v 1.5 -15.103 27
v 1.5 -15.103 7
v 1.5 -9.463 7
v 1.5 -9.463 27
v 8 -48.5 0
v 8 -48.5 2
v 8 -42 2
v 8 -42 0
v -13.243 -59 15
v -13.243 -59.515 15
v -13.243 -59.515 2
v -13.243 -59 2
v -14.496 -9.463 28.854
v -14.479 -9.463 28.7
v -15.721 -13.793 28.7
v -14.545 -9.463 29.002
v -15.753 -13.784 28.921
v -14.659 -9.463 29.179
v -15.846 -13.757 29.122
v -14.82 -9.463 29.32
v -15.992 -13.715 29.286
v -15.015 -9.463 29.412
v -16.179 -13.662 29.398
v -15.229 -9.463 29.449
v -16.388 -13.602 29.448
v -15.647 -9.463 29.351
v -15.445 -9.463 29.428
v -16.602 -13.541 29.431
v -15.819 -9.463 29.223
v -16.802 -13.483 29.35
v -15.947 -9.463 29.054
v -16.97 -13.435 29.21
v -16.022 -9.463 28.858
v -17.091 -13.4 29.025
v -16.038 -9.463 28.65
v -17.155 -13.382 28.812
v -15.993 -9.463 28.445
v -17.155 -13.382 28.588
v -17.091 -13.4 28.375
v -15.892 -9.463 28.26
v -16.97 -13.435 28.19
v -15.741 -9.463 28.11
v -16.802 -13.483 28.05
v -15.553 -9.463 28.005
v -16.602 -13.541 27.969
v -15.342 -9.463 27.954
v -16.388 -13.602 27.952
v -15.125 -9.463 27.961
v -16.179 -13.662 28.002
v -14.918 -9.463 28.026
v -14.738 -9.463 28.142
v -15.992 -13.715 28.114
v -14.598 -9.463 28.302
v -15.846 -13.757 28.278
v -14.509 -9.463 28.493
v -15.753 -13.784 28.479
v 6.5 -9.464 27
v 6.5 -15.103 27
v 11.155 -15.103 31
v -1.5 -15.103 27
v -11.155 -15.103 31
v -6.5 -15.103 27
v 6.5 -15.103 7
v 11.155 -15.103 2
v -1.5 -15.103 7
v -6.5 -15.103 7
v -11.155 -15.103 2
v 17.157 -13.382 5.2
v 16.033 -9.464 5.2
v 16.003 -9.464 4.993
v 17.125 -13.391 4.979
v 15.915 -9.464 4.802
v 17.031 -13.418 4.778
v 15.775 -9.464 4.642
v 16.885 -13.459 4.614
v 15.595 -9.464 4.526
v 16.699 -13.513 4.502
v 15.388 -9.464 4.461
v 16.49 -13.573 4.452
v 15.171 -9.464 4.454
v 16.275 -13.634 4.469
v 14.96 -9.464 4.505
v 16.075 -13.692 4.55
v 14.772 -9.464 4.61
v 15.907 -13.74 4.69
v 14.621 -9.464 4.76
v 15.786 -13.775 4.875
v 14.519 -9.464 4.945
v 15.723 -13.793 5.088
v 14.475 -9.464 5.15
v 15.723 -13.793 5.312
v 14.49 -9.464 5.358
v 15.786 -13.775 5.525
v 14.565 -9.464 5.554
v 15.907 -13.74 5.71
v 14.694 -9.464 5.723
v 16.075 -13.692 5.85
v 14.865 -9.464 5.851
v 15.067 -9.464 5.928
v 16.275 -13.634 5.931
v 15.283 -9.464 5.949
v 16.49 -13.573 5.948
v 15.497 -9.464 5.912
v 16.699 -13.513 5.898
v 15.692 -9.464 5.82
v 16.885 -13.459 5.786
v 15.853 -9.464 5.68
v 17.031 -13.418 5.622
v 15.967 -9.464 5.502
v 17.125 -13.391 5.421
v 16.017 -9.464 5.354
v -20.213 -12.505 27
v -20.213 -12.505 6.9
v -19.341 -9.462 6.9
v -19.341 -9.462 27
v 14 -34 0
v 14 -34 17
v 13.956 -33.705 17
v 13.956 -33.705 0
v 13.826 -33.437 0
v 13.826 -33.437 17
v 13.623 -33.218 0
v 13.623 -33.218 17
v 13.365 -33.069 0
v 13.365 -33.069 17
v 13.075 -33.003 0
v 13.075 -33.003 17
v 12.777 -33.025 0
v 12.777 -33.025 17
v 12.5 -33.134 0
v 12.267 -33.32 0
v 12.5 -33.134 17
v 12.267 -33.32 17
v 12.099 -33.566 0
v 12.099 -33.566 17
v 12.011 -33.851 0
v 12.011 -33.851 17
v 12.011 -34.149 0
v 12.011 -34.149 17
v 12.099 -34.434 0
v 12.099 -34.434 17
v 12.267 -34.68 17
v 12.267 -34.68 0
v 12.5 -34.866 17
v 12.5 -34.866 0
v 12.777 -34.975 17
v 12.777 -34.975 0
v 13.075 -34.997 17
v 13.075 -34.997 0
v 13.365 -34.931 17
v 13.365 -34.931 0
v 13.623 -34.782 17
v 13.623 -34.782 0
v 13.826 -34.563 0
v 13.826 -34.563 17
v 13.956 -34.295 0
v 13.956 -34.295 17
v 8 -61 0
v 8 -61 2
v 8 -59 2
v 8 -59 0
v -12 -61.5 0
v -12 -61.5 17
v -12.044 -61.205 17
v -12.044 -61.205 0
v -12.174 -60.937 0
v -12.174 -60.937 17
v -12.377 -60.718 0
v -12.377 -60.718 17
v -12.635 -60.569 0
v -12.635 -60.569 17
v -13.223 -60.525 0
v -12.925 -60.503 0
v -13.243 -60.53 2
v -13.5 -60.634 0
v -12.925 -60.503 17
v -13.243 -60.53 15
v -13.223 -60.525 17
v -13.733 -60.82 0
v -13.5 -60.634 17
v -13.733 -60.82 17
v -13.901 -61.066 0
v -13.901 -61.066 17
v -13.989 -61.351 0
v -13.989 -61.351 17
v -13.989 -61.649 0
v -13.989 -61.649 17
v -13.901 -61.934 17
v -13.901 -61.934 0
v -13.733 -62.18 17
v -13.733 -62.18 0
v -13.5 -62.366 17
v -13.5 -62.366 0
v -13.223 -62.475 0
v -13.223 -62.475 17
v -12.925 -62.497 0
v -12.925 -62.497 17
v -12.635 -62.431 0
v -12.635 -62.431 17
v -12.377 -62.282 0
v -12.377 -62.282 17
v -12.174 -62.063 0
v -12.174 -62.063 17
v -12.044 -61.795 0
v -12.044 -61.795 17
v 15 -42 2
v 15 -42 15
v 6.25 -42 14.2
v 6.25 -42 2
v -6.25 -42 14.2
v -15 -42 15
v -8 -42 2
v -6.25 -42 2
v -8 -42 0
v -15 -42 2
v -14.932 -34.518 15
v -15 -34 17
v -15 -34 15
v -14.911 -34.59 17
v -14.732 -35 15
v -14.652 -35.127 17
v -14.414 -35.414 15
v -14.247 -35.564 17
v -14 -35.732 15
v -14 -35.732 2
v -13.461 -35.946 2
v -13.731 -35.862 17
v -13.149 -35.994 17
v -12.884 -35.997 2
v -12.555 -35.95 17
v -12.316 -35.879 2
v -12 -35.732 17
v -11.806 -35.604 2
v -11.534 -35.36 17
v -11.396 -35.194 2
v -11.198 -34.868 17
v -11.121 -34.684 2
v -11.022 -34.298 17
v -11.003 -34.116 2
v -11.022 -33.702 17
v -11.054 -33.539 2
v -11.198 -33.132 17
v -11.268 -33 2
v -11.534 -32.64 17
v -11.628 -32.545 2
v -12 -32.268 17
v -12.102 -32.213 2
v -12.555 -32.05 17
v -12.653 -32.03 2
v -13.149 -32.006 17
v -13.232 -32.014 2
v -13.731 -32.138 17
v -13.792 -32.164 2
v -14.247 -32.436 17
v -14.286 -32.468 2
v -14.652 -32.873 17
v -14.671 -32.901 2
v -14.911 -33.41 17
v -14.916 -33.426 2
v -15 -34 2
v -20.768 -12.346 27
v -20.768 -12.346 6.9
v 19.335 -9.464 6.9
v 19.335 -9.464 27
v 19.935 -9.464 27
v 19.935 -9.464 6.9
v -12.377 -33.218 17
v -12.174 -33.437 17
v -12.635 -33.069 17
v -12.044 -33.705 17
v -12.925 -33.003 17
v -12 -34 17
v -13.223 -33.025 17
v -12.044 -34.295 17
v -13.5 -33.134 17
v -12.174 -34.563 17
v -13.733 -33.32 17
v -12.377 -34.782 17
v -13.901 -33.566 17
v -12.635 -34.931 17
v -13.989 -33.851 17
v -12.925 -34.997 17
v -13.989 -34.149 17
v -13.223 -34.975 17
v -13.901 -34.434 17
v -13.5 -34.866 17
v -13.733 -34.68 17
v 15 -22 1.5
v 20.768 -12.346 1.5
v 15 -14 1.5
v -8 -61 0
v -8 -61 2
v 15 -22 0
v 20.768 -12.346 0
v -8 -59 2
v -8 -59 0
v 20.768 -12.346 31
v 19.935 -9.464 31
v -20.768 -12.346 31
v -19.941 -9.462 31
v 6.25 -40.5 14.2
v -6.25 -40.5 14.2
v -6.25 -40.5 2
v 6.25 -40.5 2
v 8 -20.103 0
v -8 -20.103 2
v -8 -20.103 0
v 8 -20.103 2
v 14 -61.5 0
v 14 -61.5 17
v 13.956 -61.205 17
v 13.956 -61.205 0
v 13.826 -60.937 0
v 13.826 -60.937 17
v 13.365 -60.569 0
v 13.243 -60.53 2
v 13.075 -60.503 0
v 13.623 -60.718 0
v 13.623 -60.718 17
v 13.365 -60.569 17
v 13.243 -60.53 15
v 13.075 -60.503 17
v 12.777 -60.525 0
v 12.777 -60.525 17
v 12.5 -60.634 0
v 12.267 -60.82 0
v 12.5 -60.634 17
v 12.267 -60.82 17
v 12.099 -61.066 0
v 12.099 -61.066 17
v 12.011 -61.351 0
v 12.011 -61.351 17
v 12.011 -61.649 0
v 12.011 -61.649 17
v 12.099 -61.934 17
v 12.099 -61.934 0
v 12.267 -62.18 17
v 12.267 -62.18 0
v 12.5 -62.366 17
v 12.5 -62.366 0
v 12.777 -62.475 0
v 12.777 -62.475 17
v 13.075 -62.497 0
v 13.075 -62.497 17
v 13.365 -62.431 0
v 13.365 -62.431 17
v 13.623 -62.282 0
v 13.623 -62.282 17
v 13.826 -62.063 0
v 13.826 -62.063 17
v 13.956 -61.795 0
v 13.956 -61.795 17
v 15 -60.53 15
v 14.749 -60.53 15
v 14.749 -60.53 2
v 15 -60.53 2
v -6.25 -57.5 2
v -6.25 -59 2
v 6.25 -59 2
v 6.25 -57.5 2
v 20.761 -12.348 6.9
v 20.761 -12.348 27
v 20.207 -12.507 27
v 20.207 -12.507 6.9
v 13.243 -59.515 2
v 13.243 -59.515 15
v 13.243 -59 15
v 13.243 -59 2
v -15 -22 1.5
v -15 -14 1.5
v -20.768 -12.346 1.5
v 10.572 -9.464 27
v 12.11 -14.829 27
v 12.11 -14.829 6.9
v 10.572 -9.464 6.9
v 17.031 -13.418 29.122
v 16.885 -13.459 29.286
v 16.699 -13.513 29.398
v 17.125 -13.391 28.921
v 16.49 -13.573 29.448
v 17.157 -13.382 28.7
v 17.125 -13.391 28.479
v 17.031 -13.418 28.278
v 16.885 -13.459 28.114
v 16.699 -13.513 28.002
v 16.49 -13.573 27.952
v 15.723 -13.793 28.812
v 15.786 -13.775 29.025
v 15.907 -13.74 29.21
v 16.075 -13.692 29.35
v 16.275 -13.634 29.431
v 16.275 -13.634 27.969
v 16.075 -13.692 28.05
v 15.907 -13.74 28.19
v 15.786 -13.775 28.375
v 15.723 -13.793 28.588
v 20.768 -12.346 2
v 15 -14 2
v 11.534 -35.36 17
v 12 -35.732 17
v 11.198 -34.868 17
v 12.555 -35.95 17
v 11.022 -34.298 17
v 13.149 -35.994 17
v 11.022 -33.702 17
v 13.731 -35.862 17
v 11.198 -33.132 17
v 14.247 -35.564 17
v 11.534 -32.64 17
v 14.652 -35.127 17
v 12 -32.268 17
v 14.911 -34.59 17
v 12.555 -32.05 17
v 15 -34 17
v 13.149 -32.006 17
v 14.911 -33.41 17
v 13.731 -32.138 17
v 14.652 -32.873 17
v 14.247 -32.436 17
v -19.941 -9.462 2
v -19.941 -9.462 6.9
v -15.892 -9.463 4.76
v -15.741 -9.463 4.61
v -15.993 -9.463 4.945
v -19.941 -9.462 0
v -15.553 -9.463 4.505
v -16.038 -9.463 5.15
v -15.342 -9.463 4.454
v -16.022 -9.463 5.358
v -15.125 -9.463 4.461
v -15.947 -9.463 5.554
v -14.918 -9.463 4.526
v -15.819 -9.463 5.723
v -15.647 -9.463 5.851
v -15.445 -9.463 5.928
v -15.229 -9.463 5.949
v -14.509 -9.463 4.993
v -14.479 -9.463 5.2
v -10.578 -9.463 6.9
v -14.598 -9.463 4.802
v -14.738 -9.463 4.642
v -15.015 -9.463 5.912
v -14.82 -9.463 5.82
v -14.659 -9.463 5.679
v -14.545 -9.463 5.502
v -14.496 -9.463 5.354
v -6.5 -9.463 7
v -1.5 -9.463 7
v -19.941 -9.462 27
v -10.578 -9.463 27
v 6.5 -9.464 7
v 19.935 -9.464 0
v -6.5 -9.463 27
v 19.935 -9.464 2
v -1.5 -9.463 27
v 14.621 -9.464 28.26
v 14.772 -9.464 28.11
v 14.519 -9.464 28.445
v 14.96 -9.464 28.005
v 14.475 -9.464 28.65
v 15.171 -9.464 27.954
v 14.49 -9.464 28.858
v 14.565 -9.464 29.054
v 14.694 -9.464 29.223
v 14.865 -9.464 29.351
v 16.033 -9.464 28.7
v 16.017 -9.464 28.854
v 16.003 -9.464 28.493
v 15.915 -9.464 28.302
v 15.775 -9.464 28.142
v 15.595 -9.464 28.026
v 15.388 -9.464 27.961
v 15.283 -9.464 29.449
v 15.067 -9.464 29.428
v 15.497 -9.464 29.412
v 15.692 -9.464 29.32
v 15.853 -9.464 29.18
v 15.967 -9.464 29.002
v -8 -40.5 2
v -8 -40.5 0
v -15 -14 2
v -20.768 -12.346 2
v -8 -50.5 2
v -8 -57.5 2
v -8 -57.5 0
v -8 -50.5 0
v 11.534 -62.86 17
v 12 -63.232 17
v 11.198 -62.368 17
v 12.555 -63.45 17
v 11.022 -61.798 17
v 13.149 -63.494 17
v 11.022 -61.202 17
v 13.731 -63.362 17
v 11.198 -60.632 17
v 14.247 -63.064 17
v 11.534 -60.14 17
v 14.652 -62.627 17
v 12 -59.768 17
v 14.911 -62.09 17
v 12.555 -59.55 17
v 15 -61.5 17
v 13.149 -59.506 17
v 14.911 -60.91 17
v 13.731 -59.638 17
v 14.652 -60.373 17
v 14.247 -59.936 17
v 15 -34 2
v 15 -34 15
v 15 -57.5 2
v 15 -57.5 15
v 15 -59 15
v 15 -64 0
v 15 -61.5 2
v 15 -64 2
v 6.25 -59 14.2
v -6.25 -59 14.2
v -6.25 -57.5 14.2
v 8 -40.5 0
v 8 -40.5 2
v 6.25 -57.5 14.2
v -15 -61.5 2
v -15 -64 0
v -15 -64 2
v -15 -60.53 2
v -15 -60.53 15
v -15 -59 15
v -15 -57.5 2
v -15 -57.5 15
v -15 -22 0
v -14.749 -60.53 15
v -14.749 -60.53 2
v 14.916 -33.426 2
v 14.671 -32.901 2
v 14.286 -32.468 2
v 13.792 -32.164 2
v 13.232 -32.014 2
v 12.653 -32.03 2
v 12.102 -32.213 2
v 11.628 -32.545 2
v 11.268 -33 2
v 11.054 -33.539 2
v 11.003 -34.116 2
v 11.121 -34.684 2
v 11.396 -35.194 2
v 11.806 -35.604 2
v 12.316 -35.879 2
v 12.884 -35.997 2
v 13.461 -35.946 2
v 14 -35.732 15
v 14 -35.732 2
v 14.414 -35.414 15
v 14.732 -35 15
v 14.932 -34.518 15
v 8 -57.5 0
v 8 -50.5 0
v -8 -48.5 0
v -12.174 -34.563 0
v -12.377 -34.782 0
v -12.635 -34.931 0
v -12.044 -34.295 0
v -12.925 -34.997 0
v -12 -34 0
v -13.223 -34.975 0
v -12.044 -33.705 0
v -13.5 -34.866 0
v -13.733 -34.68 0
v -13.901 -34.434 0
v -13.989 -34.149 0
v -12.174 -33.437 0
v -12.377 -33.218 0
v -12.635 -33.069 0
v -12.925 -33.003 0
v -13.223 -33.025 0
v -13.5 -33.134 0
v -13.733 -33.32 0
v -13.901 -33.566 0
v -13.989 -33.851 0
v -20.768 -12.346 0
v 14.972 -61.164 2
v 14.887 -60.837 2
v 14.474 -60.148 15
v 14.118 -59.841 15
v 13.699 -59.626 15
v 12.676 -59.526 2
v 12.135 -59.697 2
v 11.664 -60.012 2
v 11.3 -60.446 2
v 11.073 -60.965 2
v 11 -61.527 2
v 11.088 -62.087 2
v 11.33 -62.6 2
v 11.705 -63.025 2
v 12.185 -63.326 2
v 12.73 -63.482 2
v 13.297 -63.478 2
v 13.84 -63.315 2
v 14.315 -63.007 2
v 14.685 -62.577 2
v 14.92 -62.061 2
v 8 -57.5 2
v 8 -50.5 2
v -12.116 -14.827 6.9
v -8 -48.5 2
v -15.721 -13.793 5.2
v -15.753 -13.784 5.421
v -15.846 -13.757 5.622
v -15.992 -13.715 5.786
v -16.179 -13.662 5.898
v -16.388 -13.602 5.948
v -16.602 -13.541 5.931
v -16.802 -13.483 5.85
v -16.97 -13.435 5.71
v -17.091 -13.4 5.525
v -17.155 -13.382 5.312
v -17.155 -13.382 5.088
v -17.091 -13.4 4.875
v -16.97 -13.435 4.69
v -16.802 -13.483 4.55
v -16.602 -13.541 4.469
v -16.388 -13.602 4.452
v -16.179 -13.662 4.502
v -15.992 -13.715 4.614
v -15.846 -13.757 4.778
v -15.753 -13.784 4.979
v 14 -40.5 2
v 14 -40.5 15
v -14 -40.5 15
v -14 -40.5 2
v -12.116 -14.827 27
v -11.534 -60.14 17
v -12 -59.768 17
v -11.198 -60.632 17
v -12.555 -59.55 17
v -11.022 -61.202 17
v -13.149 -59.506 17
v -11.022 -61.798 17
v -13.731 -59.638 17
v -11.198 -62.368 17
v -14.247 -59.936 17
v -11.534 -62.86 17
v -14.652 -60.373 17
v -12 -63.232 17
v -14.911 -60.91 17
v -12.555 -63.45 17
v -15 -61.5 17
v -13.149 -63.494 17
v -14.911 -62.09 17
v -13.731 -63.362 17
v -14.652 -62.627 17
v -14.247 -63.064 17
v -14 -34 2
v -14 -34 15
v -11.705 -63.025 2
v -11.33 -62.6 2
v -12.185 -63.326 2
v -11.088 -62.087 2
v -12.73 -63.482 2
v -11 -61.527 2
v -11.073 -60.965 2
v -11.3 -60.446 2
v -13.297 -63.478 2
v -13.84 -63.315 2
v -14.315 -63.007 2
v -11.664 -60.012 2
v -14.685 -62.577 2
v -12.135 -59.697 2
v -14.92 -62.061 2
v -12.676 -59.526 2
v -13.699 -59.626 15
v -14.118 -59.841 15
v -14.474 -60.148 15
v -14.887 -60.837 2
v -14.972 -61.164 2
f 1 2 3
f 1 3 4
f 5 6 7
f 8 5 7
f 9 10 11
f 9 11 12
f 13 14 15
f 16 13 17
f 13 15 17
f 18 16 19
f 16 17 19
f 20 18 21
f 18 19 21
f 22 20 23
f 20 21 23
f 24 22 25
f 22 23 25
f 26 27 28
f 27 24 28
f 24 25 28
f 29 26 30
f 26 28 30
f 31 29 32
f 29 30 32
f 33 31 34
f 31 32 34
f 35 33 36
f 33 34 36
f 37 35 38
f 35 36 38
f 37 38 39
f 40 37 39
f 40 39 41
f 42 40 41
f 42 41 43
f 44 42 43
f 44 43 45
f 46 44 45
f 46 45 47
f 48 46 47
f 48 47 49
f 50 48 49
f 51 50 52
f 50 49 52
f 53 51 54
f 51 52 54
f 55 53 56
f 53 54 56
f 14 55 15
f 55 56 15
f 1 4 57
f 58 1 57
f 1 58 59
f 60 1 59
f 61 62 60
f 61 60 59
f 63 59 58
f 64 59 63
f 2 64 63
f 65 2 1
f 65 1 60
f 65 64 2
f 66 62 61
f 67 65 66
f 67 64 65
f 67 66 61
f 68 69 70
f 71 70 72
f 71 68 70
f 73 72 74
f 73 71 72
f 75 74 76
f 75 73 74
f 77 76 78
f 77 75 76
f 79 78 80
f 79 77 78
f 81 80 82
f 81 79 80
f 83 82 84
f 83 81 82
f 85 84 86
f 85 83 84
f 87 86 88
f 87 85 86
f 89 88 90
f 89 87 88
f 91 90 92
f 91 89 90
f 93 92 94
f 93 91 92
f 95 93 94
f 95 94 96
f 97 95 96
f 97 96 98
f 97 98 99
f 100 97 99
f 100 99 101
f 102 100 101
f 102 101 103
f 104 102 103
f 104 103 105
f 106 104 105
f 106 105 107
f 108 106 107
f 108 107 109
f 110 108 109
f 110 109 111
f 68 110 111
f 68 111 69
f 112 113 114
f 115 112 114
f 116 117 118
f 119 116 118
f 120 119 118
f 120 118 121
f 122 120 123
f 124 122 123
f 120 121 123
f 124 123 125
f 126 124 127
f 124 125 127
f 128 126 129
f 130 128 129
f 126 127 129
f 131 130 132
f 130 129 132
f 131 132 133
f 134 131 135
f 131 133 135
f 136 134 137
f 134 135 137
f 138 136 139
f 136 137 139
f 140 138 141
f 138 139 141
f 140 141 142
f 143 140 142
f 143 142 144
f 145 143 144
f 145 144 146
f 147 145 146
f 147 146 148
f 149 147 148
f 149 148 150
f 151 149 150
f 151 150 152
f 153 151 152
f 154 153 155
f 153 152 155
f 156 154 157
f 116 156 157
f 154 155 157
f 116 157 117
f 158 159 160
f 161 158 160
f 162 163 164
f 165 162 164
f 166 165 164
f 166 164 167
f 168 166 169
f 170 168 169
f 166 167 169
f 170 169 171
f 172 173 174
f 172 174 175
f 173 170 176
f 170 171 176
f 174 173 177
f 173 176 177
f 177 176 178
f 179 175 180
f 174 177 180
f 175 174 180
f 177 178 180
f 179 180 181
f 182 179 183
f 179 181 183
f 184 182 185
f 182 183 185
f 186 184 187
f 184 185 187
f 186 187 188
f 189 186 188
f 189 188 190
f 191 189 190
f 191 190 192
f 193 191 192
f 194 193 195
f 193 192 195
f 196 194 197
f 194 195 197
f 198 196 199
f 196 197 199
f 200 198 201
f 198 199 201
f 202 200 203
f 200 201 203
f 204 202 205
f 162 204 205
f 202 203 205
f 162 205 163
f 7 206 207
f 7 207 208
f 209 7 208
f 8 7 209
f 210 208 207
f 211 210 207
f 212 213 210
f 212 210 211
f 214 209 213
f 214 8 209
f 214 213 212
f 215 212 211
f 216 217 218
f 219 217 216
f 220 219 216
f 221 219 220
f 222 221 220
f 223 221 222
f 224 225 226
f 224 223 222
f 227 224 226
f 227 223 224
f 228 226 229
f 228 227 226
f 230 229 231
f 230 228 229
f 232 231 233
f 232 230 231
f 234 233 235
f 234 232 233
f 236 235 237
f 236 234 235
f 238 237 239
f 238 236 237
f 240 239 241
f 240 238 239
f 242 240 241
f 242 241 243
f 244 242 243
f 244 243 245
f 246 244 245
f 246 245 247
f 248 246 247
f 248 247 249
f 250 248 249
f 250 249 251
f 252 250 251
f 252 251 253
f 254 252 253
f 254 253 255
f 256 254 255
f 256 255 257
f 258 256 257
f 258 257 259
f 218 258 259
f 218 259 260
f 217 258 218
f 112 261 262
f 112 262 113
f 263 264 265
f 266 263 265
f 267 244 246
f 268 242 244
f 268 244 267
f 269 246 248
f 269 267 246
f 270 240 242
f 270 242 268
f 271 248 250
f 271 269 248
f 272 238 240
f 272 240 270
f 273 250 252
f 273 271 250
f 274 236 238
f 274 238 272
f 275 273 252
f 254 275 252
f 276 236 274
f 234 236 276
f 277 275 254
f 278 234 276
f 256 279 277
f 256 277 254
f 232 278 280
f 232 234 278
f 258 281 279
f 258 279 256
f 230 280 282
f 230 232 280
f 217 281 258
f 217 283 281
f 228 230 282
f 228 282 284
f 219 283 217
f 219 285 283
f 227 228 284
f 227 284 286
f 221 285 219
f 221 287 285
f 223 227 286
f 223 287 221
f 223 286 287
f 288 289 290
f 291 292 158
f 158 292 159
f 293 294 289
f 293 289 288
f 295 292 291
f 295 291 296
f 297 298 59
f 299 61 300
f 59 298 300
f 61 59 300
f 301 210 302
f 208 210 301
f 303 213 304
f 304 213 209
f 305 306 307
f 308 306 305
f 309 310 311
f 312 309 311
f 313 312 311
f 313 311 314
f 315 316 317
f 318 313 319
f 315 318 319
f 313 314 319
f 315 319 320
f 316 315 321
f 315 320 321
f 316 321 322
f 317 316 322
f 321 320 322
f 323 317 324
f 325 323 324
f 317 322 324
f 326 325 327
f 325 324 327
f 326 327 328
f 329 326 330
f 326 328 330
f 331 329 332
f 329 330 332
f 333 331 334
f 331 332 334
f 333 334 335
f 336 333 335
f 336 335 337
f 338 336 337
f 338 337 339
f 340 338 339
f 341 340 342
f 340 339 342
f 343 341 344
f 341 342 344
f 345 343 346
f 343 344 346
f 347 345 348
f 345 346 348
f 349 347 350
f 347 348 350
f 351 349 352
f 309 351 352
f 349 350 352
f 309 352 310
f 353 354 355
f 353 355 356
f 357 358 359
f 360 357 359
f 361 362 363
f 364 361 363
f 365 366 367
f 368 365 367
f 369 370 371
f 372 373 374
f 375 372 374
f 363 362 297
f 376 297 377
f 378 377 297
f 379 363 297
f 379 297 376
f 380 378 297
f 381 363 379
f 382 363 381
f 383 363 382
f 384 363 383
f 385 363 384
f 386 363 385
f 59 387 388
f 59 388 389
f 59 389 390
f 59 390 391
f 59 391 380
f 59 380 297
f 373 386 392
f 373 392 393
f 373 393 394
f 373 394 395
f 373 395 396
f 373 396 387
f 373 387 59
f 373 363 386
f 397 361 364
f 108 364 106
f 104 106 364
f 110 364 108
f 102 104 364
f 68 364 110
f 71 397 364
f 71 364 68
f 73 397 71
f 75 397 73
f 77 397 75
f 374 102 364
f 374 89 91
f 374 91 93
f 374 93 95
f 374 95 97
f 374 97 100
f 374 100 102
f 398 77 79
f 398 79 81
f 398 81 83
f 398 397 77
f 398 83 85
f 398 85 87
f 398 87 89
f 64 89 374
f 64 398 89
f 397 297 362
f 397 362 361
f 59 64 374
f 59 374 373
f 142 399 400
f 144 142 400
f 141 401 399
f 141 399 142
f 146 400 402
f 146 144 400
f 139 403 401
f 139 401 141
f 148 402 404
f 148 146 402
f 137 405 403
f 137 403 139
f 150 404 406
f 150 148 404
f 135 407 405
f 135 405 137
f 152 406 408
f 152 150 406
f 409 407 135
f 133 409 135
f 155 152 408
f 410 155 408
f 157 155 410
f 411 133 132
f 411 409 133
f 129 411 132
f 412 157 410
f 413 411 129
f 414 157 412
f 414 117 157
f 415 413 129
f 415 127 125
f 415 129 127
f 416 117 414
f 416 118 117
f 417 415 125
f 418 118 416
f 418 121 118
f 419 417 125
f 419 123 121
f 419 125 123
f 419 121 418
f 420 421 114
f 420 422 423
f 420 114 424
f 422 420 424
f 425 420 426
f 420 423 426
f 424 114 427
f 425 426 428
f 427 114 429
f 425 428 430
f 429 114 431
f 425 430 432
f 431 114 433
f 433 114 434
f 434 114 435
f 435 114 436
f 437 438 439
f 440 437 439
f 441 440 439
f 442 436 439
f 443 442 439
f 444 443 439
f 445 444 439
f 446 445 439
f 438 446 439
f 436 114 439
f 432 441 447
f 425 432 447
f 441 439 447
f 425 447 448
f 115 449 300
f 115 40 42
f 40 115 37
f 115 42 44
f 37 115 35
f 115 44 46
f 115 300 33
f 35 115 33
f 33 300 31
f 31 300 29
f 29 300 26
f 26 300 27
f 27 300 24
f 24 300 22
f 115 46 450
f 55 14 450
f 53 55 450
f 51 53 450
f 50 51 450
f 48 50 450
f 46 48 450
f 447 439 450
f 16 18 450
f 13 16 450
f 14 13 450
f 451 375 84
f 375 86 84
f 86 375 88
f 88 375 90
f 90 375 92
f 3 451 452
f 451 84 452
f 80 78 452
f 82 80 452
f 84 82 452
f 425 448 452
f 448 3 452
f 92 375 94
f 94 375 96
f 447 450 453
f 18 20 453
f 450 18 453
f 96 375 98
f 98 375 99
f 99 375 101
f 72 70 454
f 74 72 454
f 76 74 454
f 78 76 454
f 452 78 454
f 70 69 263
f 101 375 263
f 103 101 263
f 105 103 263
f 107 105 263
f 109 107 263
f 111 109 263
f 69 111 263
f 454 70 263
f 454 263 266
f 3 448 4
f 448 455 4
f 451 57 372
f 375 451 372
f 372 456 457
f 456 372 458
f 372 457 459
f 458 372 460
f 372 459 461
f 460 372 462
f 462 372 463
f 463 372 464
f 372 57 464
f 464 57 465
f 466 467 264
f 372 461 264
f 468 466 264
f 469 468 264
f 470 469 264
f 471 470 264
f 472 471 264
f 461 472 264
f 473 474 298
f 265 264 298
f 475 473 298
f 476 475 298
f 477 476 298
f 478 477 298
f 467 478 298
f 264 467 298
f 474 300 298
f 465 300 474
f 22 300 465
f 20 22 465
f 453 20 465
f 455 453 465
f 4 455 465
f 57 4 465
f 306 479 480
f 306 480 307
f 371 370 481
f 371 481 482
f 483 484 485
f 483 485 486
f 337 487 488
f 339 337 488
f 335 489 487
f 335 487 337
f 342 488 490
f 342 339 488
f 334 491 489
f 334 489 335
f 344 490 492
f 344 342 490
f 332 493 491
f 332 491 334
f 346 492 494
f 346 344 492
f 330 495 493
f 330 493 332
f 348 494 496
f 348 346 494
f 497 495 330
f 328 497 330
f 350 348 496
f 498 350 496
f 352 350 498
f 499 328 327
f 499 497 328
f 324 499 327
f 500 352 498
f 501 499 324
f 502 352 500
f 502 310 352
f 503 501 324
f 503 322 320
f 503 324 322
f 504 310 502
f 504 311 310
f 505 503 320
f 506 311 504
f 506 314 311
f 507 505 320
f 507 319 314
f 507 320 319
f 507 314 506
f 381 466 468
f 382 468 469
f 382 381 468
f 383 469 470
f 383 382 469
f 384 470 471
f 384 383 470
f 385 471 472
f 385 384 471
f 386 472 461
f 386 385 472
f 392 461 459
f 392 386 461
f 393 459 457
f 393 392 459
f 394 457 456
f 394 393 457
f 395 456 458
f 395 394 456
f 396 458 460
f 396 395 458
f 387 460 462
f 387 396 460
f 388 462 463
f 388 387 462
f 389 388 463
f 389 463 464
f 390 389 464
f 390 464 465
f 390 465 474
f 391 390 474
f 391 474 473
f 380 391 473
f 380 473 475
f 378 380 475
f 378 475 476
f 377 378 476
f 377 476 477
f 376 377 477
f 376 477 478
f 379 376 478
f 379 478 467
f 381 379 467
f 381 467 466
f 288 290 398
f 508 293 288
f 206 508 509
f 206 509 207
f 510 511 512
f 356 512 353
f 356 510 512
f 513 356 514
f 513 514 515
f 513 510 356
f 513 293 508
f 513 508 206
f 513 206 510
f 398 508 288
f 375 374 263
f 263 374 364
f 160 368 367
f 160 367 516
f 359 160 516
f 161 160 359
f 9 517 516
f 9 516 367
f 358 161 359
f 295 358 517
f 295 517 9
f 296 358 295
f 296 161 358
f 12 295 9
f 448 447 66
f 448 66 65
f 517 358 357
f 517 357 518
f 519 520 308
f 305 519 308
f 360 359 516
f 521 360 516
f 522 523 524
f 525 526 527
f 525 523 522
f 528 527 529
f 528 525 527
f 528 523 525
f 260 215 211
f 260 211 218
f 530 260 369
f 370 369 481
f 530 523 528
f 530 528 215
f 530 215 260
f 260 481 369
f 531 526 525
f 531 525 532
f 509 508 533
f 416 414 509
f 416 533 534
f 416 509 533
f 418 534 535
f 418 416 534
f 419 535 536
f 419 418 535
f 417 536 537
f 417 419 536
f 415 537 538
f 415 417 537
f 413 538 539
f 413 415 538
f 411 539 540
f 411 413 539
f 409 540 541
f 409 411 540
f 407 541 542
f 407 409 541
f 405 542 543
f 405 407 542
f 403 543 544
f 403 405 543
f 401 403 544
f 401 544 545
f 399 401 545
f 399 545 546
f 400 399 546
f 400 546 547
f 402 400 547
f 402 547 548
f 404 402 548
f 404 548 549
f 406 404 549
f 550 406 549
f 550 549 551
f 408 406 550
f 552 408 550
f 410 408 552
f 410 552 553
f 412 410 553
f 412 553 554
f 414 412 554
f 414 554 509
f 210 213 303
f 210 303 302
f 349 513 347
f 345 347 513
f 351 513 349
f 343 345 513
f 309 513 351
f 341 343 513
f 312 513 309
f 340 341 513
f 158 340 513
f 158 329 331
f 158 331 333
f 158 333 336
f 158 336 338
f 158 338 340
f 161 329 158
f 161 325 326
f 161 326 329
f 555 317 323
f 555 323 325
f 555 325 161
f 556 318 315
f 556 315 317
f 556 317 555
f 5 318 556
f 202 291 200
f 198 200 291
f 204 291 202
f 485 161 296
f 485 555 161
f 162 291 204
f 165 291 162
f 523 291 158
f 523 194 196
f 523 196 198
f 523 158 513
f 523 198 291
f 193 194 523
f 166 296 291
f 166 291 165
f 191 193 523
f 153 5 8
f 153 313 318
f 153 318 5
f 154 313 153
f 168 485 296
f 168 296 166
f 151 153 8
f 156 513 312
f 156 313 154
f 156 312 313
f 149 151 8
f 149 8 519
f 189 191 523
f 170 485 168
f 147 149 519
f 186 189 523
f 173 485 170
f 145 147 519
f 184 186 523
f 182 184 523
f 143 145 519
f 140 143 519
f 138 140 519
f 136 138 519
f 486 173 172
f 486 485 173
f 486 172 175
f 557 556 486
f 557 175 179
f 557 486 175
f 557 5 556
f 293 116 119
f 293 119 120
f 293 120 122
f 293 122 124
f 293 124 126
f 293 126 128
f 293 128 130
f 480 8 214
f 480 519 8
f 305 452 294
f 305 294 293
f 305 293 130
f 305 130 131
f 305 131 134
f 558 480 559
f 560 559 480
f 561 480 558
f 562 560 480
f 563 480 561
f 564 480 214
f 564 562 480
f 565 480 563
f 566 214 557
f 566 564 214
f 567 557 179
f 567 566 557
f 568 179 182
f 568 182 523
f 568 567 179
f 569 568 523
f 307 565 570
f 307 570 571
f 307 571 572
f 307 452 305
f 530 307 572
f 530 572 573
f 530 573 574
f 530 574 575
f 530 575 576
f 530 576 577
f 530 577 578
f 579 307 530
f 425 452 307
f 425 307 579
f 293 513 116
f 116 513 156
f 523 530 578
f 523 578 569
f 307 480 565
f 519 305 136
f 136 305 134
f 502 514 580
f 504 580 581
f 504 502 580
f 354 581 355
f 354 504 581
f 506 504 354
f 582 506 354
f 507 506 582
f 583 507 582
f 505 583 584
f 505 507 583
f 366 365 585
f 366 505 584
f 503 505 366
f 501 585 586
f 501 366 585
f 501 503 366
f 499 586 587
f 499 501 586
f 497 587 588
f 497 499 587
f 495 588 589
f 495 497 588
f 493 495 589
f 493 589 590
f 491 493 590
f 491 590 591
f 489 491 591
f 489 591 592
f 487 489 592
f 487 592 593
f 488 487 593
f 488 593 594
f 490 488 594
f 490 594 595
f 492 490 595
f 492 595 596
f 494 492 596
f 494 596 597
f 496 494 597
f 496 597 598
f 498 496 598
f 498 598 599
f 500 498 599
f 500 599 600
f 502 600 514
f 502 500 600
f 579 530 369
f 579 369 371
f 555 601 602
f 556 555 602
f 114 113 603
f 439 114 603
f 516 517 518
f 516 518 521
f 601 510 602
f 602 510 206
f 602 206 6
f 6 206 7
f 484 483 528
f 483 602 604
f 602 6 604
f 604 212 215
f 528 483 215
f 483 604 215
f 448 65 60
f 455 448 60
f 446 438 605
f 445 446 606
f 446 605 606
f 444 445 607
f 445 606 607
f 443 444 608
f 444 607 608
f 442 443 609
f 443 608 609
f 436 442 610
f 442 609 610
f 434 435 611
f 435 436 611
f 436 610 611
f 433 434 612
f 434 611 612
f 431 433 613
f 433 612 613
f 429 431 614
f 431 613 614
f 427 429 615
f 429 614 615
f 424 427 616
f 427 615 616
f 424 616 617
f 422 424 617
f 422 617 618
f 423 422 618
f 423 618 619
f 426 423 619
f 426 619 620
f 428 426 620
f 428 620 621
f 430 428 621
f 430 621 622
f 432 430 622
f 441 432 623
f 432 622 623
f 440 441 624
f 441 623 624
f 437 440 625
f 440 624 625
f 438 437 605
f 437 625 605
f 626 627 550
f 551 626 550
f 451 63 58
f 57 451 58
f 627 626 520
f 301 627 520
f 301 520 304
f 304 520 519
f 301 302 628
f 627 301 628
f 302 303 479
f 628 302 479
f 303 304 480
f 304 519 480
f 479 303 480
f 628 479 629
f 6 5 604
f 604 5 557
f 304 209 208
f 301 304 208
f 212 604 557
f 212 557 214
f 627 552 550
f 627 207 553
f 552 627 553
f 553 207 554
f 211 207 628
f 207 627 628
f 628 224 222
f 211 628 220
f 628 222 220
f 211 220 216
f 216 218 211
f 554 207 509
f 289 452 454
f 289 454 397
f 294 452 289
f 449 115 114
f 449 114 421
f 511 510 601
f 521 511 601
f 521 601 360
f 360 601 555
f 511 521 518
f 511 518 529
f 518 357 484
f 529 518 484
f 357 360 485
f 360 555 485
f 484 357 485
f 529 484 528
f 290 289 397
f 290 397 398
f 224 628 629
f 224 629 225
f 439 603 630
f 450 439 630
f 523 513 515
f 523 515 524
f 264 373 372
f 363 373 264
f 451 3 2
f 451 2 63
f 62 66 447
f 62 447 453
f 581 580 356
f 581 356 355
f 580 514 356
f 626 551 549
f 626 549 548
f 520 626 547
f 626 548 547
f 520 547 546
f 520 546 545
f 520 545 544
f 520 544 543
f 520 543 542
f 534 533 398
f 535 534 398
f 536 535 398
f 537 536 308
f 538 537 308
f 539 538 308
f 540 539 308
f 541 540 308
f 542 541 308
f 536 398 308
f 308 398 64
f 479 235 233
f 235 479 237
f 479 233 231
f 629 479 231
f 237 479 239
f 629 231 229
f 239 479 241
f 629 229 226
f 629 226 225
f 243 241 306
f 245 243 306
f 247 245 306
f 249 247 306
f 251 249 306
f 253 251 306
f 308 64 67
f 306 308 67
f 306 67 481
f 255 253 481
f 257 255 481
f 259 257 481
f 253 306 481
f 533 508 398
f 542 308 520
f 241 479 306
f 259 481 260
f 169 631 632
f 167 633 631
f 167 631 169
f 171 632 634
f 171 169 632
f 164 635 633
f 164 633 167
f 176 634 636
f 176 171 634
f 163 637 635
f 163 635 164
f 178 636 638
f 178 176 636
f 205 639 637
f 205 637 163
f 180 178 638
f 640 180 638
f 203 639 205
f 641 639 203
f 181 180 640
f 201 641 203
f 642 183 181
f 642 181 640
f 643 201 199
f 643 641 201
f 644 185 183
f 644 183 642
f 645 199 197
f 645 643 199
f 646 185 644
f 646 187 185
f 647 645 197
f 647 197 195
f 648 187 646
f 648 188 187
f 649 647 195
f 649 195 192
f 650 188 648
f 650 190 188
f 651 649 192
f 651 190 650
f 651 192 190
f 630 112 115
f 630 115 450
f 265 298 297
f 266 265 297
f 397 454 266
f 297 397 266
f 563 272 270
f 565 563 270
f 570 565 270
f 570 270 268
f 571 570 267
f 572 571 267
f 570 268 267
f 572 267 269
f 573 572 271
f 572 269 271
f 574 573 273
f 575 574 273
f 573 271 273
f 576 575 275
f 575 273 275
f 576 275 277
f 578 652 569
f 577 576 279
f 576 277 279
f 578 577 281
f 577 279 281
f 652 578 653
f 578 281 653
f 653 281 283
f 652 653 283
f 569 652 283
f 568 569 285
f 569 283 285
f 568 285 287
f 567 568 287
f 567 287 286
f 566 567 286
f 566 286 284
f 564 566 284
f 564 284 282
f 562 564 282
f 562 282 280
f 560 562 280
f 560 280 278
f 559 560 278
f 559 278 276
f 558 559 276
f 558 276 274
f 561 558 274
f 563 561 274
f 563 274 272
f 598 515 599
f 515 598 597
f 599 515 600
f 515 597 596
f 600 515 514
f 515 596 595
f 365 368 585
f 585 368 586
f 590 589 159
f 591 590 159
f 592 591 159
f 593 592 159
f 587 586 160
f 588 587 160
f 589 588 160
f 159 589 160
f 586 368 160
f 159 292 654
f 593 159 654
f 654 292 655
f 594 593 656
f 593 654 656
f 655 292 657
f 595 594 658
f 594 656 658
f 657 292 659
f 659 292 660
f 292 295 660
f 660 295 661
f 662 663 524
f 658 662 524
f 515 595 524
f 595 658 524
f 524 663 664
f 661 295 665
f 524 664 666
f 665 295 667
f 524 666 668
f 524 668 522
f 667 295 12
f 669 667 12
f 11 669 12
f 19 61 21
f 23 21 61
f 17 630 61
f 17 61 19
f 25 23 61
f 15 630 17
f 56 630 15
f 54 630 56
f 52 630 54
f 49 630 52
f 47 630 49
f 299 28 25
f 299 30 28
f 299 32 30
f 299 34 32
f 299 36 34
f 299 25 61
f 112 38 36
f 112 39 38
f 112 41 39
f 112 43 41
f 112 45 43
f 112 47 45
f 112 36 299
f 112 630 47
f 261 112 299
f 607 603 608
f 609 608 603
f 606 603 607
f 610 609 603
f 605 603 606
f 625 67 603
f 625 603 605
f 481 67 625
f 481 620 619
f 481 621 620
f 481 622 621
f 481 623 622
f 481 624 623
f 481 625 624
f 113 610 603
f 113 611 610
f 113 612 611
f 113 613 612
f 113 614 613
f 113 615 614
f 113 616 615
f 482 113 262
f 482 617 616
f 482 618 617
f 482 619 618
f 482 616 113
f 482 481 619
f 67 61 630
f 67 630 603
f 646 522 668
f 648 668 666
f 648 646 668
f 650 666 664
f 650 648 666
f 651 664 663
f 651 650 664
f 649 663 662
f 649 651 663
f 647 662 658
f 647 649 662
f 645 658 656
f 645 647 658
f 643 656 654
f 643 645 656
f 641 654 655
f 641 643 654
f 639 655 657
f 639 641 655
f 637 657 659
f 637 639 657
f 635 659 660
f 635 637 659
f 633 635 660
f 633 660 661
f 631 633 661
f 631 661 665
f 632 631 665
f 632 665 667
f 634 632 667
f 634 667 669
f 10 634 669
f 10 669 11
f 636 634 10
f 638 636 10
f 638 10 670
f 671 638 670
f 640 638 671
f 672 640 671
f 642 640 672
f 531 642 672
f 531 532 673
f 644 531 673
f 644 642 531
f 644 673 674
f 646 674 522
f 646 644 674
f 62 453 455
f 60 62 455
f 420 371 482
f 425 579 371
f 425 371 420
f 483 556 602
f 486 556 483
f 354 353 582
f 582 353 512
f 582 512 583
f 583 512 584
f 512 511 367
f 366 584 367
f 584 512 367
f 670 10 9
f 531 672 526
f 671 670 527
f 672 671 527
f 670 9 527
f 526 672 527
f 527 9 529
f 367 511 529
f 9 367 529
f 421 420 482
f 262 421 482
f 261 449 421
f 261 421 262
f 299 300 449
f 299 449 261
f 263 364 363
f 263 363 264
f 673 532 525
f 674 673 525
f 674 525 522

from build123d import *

# Parameters (mm, degrees)
EXTRUDE_1_DEPTH      = 2
EXTRUDE_2_DEPTH      = 29
EXTRUDE_2_DEPTH_BACK = 2
CUT_EXTRUDE_5_REACH  = 63.117
SKETCH_3_R           = 0.75
SKETCH_3_W           = 9
SKETCH_3_H           = 20.1
CUT_EXTRUDE_7_REACH  = 63.924
SKETCH_12_R          = 0.75
SKETCH_12_W          = 9
SKETCH_12_H          = 20.1
CUT_EXTRUDE_8_REACH  = 75.269
SKETCH_13_R          = 1
SKETCH_13_W          = 16
SKETCH_13_H          = 40.897450577
EXTRUDE_START        = 15
SKETCH_15_R          = 2
SKETCH_15_R_2        = 1
EXTRUDE_9_DEPTH      = 15
CUT_EXTRUDE_9_REACH  = 63.508
SKETCH_16_W          = 5
SKETCH_16_H          = 20
EXTRUDE_10_DEPTH     = 24.1
EXTRUDE_11_DEPTH     = 1.5
CUT_EXTRUDE_10_REACH = 75.269
SKETCH_20_W          = 30
SKETCH_20_H          = 1.5
EXTRUDE_12_DEPTH     = 15
SKETCH_21_W          = 16
SKETCH_21_H          = 2
EXTRUDE_13_DEPTH     = 2
SKETCH_22_W          = 1
SKETCH_22_H          = 8
SKETCH_22_W_2        = 1.757464375
SKETCH_22_H_2        = 1.5298575
EXTRUDE_14_DEPTH     = 13
CUT_EXTRUDE_11_REACH = 64.018
SKETCH_23_W          = 12.5
SKETCH_23_H          = 12.2


with BuildPart() as part:
    # 草圖1 → 填料-伸長1 (new body)
    with BuildSketch(Plane.XY):
        Polygon((-15, 0), (15, 0), (17.19885826, 0), (20.767570176, -12.346175865), (15, -14), (15, -64), (-15, -64), (-15, -14), (-20.767570176, -12.346175865), (-17.227361215, 0), align=None)
    extrude(amount=EXTRUDE_1_DEPTH)

    # 草圖2 → 填料-伸長2 (add, two sides: drawn at the far end of the back side and taken through both)
    with BuildSketch(Plane.XY.offset(2).offset(-EXTRUDE_2_DEPTH_BACK)):
        Polygon((-19.940658108, -9.462390777), (19.934511943, -9.464160254), (20.767570176, -12.346175865), (11.154953216, -15.102549423), (-11.154953216, -15.102549423), (-20.767570176, -12.346175865), align=None)
    extrude(amount=EXTRUDE_2_DEPTH + EXTRUDE_2_DEPTH_BACK)

    # 草圖3 → 除料-伸長5 (cut, up to next)
    with BuildSketch(Plane(origin=(3.55693642, -17.281245681, 0), x_dir=(0.9612616959383193, 0.2756373558169973, 0), z_dir=(-0.2756373558169973, 0.9612616959383194, 0)), mode=Mode.PRIVATE) as cut_extrude_5_sk1:
        with Locations((13.397816779, -5.2)):
            Circle(SKETCH_3_R)
    cut_extrude_5_tool1 = extrude(cut_extrude_5_sk1.sketch, amount=CUT_EXTRUDE_5_REACH, mode=Mode.PRIVATE) & part.part
    # 草圖3 → 除料-伸長5 (cut, up to next)
    with BuildSketch(Plane(origin=(3.55693642, -17.281245681, 0), x_dir=(0.9612616959383193, 0.2756373558169973, 0), z_dir=(-0.2756373558169973, 0.9612616959383194, 0)), mode=Mode.PRIVATE) as cut_extrude_5_sk2:
        with Locations((13.397816779, -28.7)):
            Circle(SKETCH_3_R)
    cut_extrude_5_tool2 = extrude(cut_extrude_5_sk2.sketch, amount=CUT_EXTRUDE_5_REACH, mode=Mode.PRIVATE) & part.part
    # 草圖3 → 除料-伸長5 (cut, up to next)
    with BuildSketch(Plane(origin=(3.55693642, -17.281245681, 0), x_dir=(0.9612616959383193, 0.2756373558169973, 0), z_dir=(-0.2756373558169973, 0.9612616959383194, 0)), mode=Mode.PRIVATE) as cut_extrude_5_sk3:
        with Locations((13.397816779, -16.95)):
            Rectangle(SKETCH_3_W, SKETCH_3_H)
    cut_extrude_5_tool3 = extrude(cut_extrude_5_sk3.sketch, amount=CUT_EXTRUDE_5_REACH, mode=Mode.PRIVATE) & part.part
    add(cut_extrude_5_tool1.solids().sort_by_distance((16.435744, -13.588307, 5.2))[0], mode=Mode.SUBTRACT)
    add(cut_extrude_5_tool2.solids().sort_by_distance((16.435744, -13.588307, 28.7))[0], mode=Mode.SUBTRACT)
    add(cut_extrude_5_tool3.solids().sort_by_distance((16.435744, -13.588307, 16.95))[0], mode=Mode.SUBTRACT)

    # 除料-伸長7: up to this plane
    cut_extrude_7_end = Plane(origin=(-19.940658108, -9.462390777, 0), z_dir=(4.437541139610382e-05, 0.9999999990154116, 0))
    # 草圖12 → 除料-伸長7 (cut, up to the surface)
    with BuildSketch(Plane(origin=(-4.849074128, -16.910731155, 0), x_dir=(0.9612616959383179, -0.2756373558170027, 0), z_dir=(-0.2756373558170027, -0.9612616959383179, 0)), mode=Mode.PRIVATE) as cut_extrude_7_sk1:
        with Locations((-12.060002458, 28.7)):
            Circle(SKETCH_12_R)
    cut_extrude_7_tool1 = split(extrude(cut_extrude_7_sk1.sketch, amount=-CUT_EXTRUDE_7_REACH, mode=Mode.PRIVATE), bisect_by=cut_extrude_7_end, keep=Keep.BOTH, mode=Mode.PRIVATE)
    add(cut_extrude_7_tool1.solids().sort_by_distance((-16.441893, -13.586544, 28.7))[0], mode=Mode.SUBTRACT)
    # 草圖12 → 除料-伸長7 (cut, up to the surface)
    with BuildSketch(Plane(origin=(-4.849074128, -16.910731155, 0), x_dir=(0.9612616959383179, -0.2756373558170027, 0), z_dir=(-0.2756373558170027, -0.9612616959383179, 0)), mode=Mode.PRIVATE) as cut_extrude_7_sk2:
        with Locations((-12.060002458, 5.2)):
            Circle(SKETCH_12_R)
    cut_extrude_7_tool2 = split(extrude(cut_extrude_7_sk2.sketch, amount=-CUT_EXTRUDE_7_REACH, mode=Mode.PRIVATE), bisect_by=cut_extrude_7_end, keep=Keep.BOTH, mode=Mode.PRIVATE)
    add(cut_extrude_7_tool2.solids().sort_by_distance((-16.441893, -13.586544, 5.2))[0], mode=Mode.SUBTRACT)
    # 草圖12 → 除料-伸長7 (cut, up to the surface)
    with BuildSketch(Plane(origin=(-4.849074128, -16.910731155, 0), x_dir=(0.9612616959383179, -0.2756373558170027, 0), z_dir=(-0.2756373558170027, -0.9612616959383179, 0)), mode=Mode.PRIVATE) as cut_extrude_7_sk3:
        with Locations((-12.060002458, 16.95)):
            Rectangle(SKETCH_12_W, SKETCH_12_H)
    cut_extrude_7_tool3 = split(extrude(cut_extrude_7_sk3.sketch, amount=-CUT_EXTRUDE_7_REACH, mode=Mode.PRIVATE), bisect_by=cut_extrude_7_end, keep=Keep.BOTH, mode=Mode.PRIVATE)
    add(cut_extrude_7_tool3.solids().sort_by_distance((-16.441893, -13.586544, 16.95))[0], mode=Mode.SUBTRACT)

    # 草圖13 → 除料-伸長8 (cut, up to next)
    with BuildSketch(Plane.XY.offset(2), mode=Mode.PRIVATE) as cut_extrude_8_sk1:
        with Locations((-13, -34)):
            Circle(SKETCH_13_R)
    cut_extrude_8_tool1 = extrude(cut_extrude_8_sk1.sketch, amount=-CUT_EXTRUDE_8_REACH, mode=Mode.PRIVATE) & part.part
    # 草圖13 → 除料-伸長8 (cut, up to next)
    with BuildSketch(Plane.XY.offset(2), mode=Mode.PRIVATE) as cut_extrude_8_sk2:
        with Locations((13, -34)):
            Circle(SKETCH_13_R)
    cut_extrude_8_tool2 = extrude(cut_extrude_8_sk2.sketch, amount=-CUT_EXTRUDE_8_REACH, mode=Mode.PRIVATE) & part.part
    # 草圖13 → 除料-伸長8 (cut, up to next)
    with BuildSketch(Plane.XY.offset(2), mode=Mode.PRIVATE) as cut_extrude_8_sk3:
        with Locations((-13, -61.5)):
            Circle(SKETCH_13_R)
    cut_extrude_8_tool3 = extrude(cut_extrude_8_sk3.sketch, amount=-CUT_EXTRUDE_8_REACH, mode=Mode.PRIVATE) & part.part
    # 草圖13 → 除料-伸長8 (cut, up to next)
    with BuildSketch(Plane.XY.offset(2), mode=Mode.PRIVATE) as cut_extrude_8_sk4:
        with Locations((13, -61.5)):
            Circle(SKETCH_13_R)
    cut_extrude_8_tool4 = extrude(cut_extrude_8_sk4.sketch, amount=-CUT_EXTRUDE_8_REACH, mode=Mode.PRIVATE) & part.part
    # 草圖13 → 除料-伸長8 (cut, up to next)
    with BuildSketch(Plane.XY.offset(2), mode=Mode.PRIVATE) as cut_extrude_8_sk5:
        with Locations((0, -40.551274712)):
            Rectangle(SKETCH_13_W, SKETCH_13_H)
    cut_extrude_8_tool5 = extrude(cut_extrude_8_sk5.sketch, amount=-CUT_EXTRUDE_8_REACH, mode=Mode.PRIVATE) & part.part
    add(cut_extrude_8_tool1.solids().sort_by_distance((-13, -34, 2))[0], mode=Mode.SUBTRACT)
    add(cut_extrude_8_tool2.solids().sort_by_distance((13, -34, 2))[0], mode=Mode.SUBTRACT)
    add(cut_extrude_8_tool3.solids().sort_by_distance((-13, -61.5, 2))[0], mode=Mode.SUBTRACT)
    add(cut_extrude_8_tool4.solids().sort_by_distance((13, -61.5, 2))[0], mode=Mode.SUBTRACT)
    add(cut_extrude_8_tool5.solids().sort_by_distance((0, -40.551275, 2))[0], mode=Mode.SUBTRACT)

    # 草圖15 → 填料-伸長9 (add)
    # profile 1 of 4: a face of its own
    with BuildSketch(Plane.XY.offset(2).offset(EXTRUDE_START)):
        with Locations(Location((-13, -34, 0), (0, 0, 180))):
            Circle(SKETCH_15_R)
        with Locations((-13, -34)):
            Circle(SKETCH_15_R_2, mode=Mode.SUBTRACT)
    # profile 2 of 4: a face of its own
    with BuildSketch(Plane.XY.offset(2).offset(EXTRUDE_START)):
        with Locations((13, -34)):
            Circle(SKETCH_15_R)
        with Locations((13, -34)):
            Circle(SKETCH_15_R_2, mode=Mode.SUBTRACT)
    # profile 3 of 4: a face of its own
    with BuildSketch(Plane.XY.offset(2).offset(EXTRUDE_START)):
        with Locations((13, -61.5)):
            Circle(SKETCH_15_R)
        with Locations((13, -61.5)):
            Circle(SKETCH_15_R_2, mode=Mode.SUBTRACT)
    # profile 4 of 4: a face of its own
    with BuildSketch(Plane.XY.offset(2).offset(EXTRUDE_START)):
        with Locations(Location((-13, -61.5, 0), (0, 0, 180))):
            Circle(SKETCH_15_R)
        with Locations((-13, -61.5)):
            Circle(SKETCH_15_R_2, mode=Mode.SUBTRACT)
    extrude(amount=-EXTRUDE_9_DEPTH)

    # 草圖16 → 除料-伸長9 (cut, up to next)
    with BuildSketch(Plane.XZ.offset(15.102549423), mode=Mode.PRIVATE) as cut_extrude_9_sk1:
        with Locations((-4, 17)):
            Rectangle(SKETCH_16_W, SKETCH_16_H)
    cut_extrude_9_tool1 = extrude(cut_extrude_9_sk1.sketch, amount=-CUT_EXTRUDE_9_REACH, mode=Mode.PRIVATE) & part.part
    # 草圖16 → 除料-伸長9 (cut, up to next)
    with BuildSketch(Plane.XZ.offset(15.102549423), mode=Mode.PRIVATE) as cut_extrude_9_sk2:
        with Locations((4, 17)):
            Rectangle(SKETCH_16_W, SKETCH_16_H)
    cut_extrude_9_tool2 = extrude(cut_extrude_9_sk2.sketch, amount=-CUT_EXTRUDE_9_REACH, mode=Mode.PRIVATE) & part.part
    add(cut_extrude_9_tool1.solids().sort_by_distance((-4, -15.102549, 17))[0], mode=Mode.SUBTRACT)
    add(cut_extrude_9_tool2.solids().sort_by_distance((4, -15.102549, 17))[0], mode=Mode.SUBTRACT)

    # 草圖17 → 填料-伸長10 (add)
    with BuildSketch(Plane.XY.offset(31)):
        Polygon((-19.940658108, -9.462390777), (-20.767570176, -12.346175865), (-20.213148693, -12.505153667), (-19.340658109, -9.462417403), align=None)
        Polygon((19.334511943, -9.464133629), (19.934511943, -9.464160254), (20.767570176, -12.346175865), (20.207014757, -12.506912545), align=None)
    extrude(amount=-EXTRUDE_10_DEPTH)

    # 草圖18 → 填料-伸長11 (add)
    with BuildSketch(Plane(origin=(0, 0, 0), x_dir=(-1, 0, 0), z_dir=(0, 0, -1))):
        Polygon((-20.767570176, -12.346175865), (-15, -22), (-15, -14), align=None)
        Polygon((20.767570176, -12.346175865), (15, -14), (15, -22), align=None)
    extrude(amount=-EXTRUDE_11_DEPTH)

    # 草圖19 → 除料-伸長10 (cut, up to next)
    with BuildSketch(Plane.XY.offset(2), mode=Mode.PRIVATE) as cut_extrude_10_sk1:
        Polygon((-19.940658108, -9.462390777), (19.934511943, -9.464160254), (19.934511943, 2.341545169), (-19.940658108, 2.341545169), align=None)
    cut_extrude_10_tool1 = extrude(cut_extrude_10_sk1.sketch, amount=-CUT_EXTRUDE_10_REACH, mode=Mode.PRIVATE) & part.part
    add(cut_extrude_10_tool1.solids().sort_by_distance((-0.002575, -3.560865, 2))[0], mode=Mode.SUBTRACT)

    # 草圖20 → 填料-伸長12 (add)
    with BuildSketch(Plane(origin=(0, 0, 0), x_dir=(-1, 0, 0), z_dir=(0, 0, -1))):
        with Locations((0, -58.25)):
            Rectangle(SKETCH_20_W, SKETCH_20_H)
        with Locations((0, -41.25)):
            Rectangle(SKETCH_20_W, SKETCH_20_H)
    extrude(amount=-EXTRUDE_12_DEPTH)

    # 草圖21 → 填料-伸長13 (add)
    with BuildSketch(Plane(origin=(0, 0, 0), x_dir=(-1, 0, 0), z_dir=(0, 0, -1))):
        with Locations((0, -49.5)):
            Rectangle(SKETCH_21_W, SKETCH_21_H)
    extrude(amount=-EXTRUDE_13_DEPTH)

    # 草圖22 → 填料-伸長14 (add)
    with BuildSketch(Plane.XY.offset(15)):
        with Locations((14.5, -38)):
            Rectangle(SKETCH_22_W, SKETCH_22_H)
        with Locations((-14.5, -38)):
            Rectangle(SKETCH_22_W, SKETCH_22_H)
        with Locations((14.121267813, -59.76492875)):
            Rectangle(SKETCH_22_W_2, SKETCH_22_H_2)
        with Locations((-14.121267813, -59.76492875)):
            Rectangle(SKETCH_22_W_2, SKETCH_22_H_2)
    extrude(amount=-EXTRUDE_14_DEPTH)

    # 除料-伸長11: up to this face of the body (flat: up to its plane)
    cut_extrude_11_end = Plane(part.part.faces().sort_by_distance((0, -40.5, 7.893939394))[0])
    # 草圖23 → 除料-伸長11 (cut, up to the picked face)
    with BuildSketch(Plane.XZ.offset(59), mode=Mode.PRIVATE) as cut_extrude_11_sk1:
        with Locations((0, 8.1)):
            Rectangle(SKETCH_23_W, SKETCH_23_H)
    cut_extrude_11_tool1 = split(extrude(cut_extrude_11_sk1.sketch, amount=-CUT_EXTRUDE_11_REACH, mode=Mode.PRIVATE), bisect_by=cut_extrude_11_end, keep=Keep.BOTH, mode=Mode.PRIVATE)
    add(cut_extrude_11_tool1.solids().sort_by(Axis((0, -59, 8.1), (0, 1, 0)))[0], mode=Mode.SUBTRACT)


solid = part.part
